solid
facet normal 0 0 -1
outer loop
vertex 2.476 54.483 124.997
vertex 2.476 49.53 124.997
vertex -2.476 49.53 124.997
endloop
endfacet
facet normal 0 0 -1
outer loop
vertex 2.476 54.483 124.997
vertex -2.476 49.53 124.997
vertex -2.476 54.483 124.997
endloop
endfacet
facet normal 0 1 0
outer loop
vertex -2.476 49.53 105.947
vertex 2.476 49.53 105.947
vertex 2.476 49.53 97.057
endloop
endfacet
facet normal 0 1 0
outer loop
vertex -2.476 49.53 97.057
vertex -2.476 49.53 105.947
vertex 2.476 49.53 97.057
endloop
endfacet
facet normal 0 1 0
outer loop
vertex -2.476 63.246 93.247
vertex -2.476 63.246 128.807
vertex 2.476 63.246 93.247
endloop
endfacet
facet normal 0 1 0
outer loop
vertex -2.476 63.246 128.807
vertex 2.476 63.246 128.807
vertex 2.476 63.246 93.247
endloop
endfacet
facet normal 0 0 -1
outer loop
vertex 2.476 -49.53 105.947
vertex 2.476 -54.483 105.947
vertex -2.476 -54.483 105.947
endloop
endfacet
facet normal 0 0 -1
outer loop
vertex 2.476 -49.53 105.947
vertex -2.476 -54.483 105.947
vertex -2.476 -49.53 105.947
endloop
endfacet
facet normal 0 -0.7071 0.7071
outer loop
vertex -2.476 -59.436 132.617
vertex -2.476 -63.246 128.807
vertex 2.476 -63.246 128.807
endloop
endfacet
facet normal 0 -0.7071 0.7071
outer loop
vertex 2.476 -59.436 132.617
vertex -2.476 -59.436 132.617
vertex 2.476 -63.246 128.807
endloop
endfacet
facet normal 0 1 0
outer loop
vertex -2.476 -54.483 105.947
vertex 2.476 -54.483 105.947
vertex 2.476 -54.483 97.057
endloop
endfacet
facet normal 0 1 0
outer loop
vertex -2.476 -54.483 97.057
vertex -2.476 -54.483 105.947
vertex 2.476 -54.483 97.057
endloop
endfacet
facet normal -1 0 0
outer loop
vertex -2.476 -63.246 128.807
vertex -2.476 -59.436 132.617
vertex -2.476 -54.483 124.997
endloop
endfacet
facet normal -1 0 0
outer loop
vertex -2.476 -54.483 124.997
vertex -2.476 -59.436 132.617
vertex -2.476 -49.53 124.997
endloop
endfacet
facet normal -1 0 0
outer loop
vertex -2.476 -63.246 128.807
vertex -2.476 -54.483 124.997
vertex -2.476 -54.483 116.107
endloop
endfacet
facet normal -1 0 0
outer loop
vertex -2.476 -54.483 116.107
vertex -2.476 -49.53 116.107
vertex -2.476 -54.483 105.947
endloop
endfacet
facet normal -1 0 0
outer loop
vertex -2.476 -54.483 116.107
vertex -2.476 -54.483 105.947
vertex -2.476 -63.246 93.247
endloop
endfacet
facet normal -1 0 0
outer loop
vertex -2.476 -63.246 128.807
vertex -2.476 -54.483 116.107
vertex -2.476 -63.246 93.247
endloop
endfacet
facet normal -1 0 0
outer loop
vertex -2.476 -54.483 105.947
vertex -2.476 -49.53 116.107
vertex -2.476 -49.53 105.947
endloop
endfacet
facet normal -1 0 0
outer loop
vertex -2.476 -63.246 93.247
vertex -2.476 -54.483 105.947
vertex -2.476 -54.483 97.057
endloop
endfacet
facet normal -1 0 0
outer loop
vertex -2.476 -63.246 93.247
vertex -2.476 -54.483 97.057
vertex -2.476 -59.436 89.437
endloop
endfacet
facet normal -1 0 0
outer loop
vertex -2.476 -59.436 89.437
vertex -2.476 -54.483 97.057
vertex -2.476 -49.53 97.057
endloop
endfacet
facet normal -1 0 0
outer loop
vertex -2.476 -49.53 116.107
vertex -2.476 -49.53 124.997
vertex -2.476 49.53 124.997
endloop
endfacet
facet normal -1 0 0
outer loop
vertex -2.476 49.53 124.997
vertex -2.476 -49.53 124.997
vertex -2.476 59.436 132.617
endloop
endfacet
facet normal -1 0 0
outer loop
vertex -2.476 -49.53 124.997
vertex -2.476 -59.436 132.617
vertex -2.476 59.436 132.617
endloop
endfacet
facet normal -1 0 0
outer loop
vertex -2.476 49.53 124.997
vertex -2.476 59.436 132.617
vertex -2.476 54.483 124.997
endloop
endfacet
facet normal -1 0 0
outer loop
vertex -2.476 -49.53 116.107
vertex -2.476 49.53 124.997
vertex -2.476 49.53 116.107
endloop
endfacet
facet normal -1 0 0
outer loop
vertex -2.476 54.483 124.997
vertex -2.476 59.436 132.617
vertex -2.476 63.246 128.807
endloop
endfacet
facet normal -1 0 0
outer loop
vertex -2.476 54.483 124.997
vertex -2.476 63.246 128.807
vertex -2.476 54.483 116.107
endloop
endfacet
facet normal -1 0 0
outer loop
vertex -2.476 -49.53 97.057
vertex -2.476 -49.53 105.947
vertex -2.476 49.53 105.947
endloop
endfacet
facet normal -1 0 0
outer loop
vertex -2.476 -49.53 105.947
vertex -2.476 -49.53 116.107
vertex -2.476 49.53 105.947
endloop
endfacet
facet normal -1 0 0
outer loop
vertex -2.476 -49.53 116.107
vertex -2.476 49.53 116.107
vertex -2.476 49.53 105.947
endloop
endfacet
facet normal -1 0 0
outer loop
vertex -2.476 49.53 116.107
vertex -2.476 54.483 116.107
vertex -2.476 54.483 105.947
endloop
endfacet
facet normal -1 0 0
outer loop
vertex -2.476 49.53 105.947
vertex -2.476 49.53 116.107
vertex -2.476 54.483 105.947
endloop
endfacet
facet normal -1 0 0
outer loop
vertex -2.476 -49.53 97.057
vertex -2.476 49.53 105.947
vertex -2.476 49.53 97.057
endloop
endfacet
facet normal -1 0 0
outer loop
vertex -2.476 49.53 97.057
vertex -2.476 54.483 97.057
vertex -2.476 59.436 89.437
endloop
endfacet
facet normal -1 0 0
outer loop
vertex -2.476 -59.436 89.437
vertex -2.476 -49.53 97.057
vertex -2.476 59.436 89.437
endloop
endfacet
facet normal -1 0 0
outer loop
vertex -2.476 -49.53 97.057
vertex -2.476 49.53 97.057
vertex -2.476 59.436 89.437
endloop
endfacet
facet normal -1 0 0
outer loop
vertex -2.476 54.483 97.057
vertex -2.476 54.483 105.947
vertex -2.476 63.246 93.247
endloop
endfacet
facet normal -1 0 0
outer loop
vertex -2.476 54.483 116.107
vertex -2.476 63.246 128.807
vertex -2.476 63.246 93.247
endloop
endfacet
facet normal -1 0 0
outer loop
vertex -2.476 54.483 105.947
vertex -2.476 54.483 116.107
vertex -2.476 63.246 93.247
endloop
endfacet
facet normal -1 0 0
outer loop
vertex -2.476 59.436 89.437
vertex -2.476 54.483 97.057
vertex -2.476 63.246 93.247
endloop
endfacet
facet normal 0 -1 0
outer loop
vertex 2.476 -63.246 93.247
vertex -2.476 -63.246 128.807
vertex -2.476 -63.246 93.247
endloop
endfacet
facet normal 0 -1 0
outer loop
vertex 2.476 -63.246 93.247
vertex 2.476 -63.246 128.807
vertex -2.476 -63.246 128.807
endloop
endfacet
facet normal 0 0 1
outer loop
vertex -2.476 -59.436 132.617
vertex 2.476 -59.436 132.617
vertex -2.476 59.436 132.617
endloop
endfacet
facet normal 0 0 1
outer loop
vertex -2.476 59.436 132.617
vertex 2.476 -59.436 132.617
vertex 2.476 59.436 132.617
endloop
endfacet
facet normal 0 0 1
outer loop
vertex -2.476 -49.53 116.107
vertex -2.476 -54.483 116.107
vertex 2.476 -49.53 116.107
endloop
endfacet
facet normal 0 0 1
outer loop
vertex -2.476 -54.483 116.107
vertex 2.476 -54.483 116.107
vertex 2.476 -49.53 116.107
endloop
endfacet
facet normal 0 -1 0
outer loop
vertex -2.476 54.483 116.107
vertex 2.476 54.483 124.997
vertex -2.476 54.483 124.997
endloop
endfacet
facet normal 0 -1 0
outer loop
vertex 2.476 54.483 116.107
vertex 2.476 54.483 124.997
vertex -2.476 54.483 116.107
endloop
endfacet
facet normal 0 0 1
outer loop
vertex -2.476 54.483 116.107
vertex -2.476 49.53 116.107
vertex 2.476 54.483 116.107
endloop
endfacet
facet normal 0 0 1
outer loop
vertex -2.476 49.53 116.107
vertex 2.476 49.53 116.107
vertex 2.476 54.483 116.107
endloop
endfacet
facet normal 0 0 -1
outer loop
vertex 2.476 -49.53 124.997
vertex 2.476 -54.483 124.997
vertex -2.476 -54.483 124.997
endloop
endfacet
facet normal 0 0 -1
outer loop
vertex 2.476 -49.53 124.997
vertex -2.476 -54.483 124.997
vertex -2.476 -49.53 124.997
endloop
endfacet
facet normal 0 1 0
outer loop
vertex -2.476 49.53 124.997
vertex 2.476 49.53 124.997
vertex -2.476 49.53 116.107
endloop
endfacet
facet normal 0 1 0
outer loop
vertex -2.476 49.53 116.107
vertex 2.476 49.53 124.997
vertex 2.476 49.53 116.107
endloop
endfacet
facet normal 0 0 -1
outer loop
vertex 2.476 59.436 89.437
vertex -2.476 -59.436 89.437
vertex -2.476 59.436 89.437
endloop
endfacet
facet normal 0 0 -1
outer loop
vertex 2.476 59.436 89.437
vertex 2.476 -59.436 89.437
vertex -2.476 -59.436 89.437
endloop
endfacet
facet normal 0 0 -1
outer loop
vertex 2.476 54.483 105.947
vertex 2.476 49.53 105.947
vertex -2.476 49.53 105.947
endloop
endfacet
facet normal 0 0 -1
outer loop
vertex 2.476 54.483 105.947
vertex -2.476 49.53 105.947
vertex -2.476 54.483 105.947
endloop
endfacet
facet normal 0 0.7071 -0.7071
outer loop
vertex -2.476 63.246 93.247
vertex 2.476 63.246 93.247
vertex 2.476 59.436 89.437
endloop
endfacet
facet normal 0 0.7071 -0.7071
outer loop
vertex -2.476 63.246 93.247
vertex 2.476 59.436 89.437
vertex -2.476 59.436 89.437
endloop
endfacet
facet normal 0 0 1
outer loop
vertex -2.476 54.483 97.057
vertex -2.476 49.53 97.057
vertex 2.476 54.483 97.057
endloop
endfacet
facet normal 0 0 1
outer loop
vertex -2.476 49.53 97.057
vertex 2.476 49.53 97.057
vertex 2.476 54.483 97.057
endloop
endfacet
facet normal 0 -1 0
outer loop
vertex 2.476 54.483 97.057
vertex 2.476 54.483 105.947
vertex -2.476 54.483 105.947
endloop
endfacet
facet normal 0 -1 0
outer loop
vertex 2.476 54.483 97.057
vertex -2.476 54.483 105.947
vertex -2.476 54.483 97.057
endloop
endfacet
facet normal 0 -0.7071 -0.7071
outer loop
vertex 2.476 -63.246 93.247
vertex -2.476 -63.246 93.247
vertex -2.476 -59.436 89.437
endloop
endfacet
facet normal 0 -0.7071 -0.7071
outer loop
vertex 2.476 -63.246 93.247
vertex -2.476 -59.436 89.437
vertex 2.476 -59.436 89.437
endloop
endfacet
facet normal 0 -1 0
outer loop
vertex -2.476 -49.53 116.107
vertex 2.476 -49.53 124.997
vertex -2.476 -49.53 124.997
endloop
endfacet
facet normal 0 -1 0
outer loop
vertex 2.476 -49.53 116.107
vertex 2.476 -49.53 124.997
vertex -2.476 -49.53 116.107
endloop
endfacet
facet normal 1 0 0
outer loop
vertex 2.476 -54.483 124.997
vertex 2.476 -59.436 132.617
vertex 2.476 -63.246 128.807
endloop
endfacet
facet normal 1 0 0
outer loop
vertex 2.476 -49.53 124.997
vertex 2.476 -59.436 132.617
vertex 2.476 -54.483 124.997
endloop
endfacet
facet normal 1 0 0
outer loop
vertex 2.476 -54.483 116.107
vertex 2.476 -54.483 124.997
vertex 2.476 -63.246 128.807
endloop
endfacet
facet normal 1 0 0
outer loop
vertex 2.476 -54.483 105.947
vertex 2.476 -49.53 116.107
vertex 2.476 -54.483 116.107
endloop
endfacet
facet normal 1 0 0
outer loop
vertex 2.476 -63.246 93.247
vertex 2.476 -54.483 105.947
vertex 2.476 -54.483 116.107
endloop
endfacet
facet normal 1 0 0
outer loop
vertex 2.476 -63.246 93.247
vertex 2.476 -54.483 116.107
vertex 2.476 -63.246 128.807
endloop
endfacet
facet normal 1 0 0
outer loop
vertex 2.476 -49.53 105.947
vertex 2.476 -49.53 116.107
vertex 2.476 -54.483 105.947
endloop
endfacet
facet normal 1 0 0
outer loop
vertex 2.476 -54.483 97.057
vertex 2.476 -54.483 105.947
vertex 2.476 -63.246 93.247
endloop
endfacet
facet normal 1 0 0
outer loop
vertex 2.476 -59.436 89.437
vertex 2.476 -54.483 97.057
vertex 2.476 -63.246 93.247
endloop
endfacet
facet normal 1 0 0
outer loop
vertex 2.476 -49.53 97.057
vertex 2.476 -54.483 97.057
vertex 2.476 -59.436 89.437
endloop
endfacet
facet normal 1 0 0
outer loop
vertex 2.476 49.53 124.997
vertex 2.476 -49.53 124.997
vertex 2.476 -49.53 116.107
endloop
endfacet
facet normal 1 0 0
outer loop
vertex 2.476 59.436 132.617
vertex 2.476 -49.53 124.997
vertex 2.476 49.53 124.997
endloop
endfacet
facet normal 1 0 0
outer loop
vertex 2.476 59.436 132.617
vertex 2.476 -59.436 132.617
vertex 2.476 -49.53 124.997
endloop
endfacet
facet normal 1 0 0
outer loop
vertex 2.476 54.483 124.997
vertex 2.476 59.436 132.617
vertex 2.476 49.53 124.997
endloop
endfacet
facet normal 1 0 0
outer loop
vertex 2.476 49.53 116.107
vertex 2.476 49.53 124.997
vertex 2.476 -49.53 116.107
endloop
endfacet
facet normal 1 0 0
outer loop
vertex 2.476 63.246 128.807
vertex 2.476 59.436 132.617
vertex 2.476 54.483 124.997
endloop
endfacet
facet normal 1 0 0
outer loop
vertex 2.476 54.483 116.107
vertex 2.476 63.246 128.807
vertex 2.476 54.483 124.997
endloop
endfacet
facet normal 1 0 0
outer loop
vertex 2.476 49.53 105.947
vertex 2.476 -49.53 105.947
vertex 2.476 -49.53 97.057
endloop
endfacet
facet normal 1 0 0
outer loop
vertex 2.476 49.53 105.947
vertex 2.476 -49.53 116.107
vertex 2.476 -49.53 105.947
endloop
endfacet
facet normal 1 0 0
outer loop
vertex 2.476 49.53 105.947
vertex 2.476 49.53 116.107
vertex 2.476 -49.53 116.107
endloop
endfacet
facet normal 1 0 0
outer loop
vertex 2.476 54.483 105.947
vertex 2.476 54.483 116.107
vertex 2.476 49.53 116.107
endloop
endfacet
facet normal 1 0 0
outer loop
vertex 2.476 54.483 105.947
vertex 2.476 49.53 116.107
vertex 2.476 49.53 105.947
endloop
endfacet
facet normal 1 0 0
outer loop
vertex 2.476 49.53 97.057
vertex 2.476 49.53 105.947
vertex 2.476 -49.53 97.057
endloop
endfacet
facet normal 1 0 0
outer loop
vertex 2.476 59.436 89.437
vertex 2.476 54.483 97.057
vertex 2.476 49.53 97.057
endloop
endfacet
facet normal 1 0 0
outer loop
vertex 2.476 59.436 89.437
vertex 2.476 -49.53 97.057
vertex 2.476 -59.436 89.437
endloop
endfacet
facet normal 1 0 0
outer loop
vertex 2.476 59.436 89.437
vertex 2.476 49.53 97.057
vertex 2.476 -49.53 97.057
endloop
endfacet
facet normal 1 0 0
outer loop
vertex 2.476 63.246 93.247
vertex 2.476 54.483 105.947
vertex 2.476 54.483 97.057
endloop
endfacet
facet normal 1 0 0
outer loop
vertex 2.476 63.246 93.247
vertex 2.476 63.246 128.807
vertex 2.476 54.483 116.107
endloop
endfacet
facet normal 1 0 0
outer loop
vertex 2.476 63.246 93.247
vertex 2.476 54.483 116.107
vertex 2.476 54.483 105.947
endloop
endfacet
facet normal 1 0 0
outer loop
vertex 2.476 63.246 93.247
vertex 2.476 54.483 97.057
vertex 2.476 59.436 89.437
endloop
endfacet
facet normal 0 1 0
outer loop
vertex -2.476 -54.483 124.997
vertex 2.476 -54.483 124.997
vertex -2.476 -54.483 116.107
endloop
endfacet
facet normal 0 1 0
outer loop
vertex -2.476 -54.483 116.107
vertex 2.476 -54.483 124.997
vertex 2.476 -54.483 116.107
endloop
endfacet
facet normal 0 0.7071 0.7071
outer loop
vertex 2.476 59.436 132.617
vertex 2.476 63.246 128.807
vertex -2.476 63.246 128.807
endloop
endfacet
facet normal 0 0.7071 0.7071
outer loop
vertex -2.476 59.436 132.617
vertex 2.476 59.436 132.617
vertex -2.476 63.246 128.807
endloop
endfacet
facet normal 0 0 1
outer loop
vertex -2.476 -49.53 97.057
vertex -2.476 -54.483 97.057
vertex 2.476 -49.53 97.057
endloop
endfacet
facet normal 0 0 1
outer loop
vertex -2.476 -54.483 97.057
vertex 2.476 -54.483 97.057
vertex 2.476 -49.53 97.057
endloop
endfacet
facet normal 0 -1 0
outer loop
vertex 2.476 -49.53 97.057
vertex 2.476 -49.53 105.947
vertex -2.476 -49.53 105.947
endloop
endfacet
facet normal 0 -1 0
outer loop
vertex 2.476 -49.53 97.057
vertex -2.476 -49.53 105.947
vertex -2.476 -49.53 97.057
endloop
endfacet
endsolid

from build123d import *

# Parameters (mm, degrees)
SKETCH1_W           = 43.18
SKETCH1_H           = 126.492
SKETCH1_W_2         = 8.89
SKETCH1_H_2         = 4.953
BOSS_EXTRUDE1_DEPTH = 2.4765
CHAMFER1_SIZE       = 3.81


with BuildPart() as part:
    # Sketch1 → Boss-Extrude1 (new body, symmetric)
    with BuildSketch(Plane(origin=(0, 0, 0), x_dir=(0, 0, -1), z_dir=(1, 0, 0))):
        with Locations((-111.027292876, 0)):
            Rectangle(SKETCH1_W, SKETCH1_H)
        with Locations((-101.502292876, 52.0065)):
            Rectangle(SKETCH1_W_2, SKETCH1_H_2, mode=Mode.SUBTRACT)
        with Locations((-120.552292876, 52.0065)):
            Rectangle(SKETCH1_W_2, SKETCH1_H_2, mode=Mode.SUBTRACT)
        with Locations((-101.502292876, -52.0065)):
            Rectangle(SKETCH1_W_2, SKETCH1_H_2, mode=Mode.SUBTRACT)
        with Locations((-120.552292876, -52.0065)):
            Rectangle(SKETCH1_W_2, SKETCH1_H_2, mode=Mode.SUBTRACT)
    extrude(amount=BOSS_EXTRUDE1_DEPTH, both=True)

    # Chamfer1
    chamfer1_edges = [part.edges().sort_by_distance(p)[0] for p in [
        (0, -63.246, 89.437292876),
        (0, -63.246, 132.617292876),
        (0, 63.246, 132.617292876),
        (0, 63.246, 89.437292876),
    ]]
    chamfer(chamfer1_edges, length=CHAMFER1_SIZE)


solid = part.part
